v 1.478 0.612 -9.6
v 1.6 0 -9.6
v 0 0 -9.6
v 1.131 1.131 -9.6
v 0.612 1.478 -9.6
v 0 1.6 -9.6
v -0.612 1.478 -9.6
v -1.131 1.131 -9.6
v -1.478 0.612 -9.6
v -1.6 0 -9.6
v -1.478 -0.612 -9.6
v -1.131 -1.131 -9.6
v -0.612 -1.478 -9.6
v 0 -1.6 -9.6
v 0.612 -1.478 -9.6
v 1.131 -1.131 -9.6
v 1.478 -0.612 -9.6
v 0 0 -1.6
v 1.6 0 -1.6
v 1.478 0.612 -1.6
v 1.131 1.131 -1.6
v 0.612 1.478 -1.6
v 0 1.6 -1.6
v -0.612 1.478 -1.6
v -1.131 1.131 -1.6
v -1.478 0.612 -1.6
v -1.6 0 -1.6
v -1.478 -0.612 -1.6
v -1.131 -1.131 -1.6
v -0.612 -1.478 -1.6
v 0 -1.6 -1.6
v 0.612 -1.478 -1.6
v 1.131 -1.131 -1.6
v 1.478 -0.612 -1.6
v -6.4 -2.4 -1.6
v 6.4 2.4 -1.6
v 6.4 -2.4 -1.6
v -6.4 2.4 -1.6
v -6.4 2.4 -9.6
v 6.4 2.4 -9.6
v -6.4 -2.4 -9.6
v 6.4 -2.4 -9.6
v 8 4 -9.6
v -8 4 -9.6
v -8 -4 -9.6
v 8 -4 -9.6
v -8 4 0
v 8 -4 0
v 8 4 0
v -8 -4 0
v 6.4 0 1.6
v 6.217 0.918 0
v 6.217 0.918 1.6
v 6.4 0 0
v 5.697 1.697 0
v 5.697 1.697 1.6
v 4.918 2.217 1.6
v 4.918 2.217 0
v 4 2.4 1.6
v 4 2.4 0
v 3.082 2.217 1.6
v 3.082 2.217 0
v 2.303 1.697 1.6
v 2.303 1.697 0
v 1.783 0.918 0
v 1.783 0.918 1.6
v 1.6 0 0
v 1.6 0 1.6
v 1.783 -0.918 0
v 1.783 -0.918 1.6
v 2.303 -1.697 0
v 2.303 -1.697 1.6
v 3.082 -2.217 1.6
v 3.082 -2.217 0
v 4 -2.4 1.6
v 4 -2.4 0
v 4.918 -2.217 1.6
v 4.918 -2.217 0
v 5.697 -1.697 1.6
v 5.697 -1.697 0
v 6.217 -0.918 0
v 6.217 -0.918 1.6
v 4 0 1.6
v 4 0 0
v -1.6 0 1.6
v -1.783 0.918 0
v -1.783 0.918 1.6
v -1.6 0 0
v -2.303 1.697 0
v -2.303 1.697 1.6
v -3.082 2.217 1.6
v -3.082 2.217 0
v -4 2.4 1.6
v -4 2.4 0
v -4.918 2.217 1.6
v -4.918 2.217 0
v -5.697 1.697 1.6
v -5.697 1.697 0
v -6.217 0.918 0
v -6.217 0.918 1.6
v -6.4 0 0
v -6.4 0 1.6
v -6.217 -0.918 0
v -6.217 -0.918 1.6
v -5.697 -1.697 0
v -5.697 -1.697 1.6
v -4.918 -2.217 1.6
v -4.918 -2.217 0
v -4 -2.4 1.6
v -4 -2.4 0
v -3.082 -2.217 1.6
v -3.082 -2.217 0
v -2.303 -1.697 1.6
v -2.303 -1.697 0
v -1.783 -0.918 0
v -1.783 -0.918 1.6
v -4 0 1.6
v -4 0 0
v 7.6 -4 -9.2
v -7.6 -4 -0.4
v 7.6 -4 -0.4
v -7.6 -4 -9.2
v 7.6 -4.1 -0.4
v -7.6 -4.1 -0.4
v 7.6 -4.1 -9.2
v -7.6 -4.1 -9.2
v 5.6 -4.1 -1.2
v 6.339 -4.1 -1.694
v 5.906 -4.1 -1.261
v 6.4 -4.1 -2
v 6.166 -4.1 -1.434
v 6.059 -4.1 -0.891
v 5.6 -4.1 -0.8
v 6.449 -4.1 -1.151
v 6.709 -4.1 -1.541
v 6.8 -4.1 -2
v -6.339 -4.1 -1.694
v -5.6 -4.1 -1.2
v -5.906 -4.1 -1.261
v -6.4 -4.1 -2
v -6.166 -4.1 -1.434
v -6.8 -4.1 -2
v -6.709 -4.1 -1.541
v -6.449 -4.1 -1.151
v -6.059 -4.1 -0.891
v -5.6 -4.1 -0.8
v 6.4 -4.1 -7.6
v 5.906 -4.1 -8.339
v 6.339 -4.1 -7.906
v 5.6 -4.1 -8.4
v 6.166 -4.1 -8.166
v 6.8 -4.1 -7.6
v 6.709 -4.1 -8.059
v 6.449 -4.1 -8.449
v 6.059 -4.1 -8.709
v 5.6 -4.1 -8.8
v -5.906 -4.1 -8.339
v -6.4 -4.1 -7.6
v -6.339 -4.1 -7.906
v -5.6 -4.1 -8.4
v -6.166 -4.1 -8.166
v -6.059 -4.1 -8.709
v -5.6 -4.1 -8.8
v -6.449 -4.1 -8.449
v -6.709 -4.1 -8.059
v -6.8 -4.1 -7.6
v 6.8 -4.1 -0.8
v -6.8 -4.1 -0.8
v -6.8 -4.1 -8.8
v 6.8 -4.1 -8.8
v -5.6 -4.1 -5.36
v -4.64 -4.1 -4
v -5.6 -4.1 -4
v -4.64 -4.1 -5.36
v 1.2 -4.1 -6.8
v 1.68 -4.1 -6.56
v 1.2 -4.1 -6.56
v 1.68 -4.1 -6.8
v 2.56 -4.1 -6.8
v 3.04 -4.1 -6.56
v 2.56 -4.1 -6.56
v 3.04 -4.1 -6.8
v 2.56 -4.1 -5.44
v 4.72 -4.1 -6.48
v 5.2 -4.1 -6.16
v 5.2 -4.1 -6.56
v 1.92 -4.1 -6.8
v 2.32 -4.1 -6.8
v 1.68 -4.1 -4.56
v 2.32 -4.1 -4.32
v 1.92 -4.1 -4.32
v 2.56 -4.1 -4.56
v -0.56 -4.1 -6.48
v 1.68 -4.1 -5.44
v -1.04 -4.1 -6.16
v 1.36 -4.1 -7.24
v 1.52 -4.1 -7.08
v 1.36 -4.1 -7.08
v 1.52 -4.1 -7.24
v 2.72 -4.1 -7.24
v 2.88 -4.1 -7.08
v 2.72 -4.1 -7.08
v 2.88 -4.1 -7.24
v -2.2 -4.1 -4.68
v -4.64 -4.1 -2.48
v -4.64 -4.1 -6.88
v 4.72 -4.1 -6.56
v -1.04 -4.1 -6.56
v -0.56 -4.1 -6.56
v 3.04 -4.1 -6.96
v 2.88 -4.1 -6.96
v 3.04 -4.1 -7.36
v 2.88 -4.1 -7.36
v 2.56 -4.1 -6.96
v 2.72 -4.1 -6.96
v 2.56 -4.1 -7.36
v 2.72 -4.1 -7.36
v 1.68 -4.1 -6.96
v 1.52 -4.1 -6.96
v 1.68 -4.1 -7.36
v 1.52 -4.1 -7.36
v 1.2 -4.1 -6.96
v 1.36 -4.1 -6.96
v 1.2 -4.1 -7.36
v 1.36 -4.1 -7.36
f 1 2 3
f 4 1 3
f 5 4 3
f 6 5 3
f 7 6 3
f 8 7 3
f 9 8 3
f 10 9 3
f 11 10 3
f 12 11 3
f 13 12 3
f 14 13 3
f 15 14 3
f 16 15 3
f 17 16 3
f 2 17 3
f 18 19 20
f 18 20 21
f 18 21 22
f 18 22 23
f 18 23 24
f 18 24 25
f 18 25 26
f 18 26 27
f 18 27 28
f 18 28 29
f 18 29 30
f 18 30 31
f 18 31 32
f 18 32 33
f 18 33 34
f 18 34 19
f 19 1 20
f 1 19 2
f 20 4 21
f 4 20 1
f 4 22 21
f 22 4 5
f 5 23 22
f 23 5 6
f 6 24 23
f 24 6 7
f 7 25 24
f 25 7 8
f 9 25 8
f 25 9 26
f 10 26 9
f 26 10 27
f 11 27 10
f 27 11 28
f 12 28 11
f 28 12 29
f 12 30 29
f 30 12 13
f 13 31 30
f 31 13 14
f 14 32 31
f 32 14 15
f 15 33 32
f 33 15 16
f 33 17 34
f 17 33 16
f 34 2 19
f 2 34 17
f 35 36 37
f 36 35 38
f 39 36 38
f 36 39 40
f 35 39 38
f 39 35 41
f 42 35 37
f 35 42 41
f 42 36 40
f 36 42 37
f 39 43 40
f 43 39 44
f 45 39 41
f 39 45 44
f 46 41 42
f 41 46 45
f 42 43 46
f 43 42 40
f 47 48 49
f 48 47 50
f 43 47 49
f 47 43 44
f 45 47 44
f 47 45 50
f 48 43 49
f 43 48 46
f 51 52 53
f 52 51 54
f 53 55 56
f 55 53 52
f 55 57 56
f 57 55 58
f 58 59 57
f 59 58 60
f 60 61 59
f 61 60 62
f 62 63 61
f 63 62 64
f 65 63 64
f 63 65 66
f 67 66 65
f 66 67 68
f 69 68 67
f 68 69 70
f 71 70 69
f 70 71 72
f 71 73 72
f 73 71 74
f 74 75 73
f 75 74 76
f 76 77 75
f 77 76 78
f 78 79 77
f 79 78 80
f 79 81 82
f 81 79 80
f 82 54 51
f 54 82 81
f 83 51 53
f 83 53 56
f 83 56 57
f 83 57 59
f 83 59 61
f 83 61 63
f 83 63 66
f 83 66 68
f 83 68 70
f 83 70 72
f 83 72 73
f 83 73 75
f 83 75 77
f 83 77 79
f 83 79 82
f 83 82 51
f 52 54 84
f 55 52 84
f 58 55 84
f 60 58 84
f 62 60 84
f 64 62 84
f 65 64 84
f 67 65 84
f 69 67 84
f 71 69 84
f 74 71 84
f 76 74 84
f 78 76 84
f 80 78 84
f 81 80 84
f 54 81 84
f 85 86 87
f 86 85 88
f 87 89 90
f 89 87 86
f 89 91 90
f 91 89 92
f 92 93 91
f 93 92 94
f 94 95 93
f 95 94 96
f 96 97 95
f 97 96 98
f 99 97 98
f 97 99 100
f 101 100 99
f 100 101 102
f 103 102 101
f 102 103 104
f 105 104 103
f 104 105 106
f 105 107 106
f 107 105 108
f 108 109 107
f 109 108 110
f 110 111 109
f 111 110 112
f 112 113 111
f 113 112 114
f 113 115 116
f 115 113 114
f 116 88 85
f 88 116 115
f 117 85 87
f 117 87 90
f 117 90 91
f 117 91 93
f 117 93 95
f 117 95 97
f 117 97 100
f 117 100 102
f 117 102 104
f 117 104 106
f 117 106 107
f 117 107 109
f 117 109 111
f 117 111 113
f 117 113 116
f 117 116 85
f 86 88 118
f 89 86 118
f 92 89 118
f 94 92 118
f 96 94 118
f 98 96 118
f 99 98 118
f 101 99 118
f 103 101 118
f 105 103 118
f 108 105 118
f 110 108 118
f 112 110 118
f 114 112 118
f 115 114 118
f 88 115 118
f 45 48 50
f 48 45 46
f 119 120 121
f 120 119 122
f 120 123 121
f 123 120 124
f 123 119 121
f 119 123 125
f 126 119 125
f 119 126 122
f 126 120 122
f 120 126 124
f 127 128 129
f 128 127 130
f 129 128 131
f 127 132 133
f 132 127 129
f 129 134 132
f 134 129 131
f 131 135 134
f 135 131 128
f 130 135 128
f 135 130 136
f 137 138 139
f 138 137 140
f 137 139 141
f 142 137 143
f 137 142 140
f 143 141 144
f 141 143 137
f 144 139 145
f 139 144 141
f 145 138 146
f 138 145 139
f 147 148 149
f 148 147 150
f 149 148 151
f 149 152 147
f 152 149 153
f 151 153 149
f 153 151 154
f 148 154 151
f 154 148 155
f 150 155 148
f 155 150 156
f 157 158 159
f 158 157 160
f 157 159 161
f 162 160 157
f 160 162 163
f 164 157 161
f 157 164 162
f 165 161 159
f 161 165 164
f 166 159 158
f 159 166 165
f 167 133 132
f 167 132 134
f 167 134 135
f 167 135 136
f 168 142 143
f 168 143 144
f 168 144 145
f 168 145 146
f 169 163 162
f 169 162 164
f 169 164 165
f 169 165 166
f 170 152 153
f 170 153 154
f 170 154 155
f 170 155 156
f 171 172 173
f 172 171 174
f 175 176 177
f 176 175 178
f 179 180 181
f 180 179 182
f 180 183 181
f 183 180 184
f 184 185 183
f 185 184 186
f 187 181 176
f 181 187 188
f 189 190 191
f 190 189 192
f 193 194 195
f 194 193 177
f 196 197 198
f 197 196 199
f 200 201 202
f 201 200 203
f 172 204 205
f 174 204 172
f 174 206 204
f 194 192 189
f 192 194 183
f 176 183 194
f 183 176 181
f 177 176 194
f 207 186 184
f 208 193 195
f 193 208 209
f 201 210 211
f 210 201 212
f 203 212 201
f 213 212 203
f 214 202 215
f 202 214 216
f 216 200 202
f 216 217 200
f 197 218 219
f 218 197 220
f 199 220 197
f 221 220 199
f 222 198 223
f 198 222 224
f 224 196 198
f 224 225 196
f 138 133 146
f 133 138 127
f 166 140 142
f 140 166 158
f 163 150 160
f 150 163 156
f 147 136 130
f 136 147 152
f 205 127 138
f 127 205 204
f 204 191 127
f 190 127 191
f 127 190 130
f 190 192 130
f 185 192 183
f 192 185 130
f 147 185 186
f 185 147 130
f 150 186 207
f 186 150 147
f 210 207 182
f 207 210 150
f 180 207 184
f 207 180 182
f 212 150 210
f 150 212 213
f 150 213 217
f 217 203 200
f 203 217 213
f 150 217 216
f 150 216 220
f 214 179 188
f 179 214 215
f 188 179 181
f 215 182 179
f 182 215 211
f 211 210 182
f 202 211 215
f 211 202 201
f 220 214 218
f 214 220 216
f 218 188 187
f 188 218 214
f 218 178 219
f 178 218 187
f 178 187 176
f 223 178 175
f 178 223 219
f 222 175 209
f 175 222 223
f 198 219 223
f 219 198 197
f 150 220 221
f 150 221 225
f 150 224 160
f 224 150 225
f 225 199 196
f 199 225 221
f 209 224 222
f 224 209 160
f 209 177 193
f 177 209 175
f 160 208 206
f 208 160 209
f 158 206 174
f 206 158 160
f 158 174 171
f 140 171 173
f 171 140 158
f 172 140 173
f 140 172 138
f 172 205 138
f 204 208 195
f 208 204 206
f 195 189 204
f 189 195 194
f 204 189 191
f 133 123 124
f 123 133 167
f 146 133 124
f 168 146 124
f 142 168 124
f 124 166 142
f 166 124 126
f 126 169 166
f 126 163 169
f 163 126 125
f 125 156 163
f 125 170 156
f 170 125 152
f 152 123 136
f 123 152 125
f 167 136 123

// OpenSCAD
// file: ../p/4-4edge.scad
use <../lib.scad>
function ldraw_lib__4_4edge() = [
// 0 Circle 1.0
// 0 Name: 4-4edge.dat
// 0 Author: James Jessiman
// 0 !LDRAW_ORG Primitive UPDATE 2017-01
// 0 !LICENSE Licensed under CC BY 2.0 and CC BY 4.0 : see CAreadme.txt
// 
// 0 BFC CERTIFY CCW
  [0,"BFC","CERTIFY"],
  [0,"BFC","CCW"],
// 
// 0 !HISTORY 1998-12-15 [PTadmin] Official Update 1998-10
// 0 !HISTORY 2005-12-28 [PTadmin] Official Update 2005-01
// 0 !HISTORY 2007-06-24 [PTadmin] Header formatted for Contributor Agreement
// 0 !HISTORY 2008-07-01 [PTadmin] Official Update 2008-01
// 0 !HISTORY 2017-01-15 [Steffen] BFCed
// 0 !HISTORY 2017-12-30 [PTadmin] Official Update 2017-01
// 
// 
// 2 24 1 0 0 0.9239 0 0.3827
  [2,24,1,0,0,0.9239,0,0.3827],
// 2 24 0.9239 0 0.3827 0.7071 0 0.7071
  [2,24,0.9239,0,0.3827,0.7071,0,0.7071],
// 2 24 0.7071 0 0.7071 0.3827 0 0.9239
  [2,24,0.7071,0,0.7071,0.3827,0,0.9239],
// 2 24 0.3827 0 0.9239 0 0 1
  [2,24,0.3827,0,0.9239,0,0,1],
// 2 24 0 0 1 -0.3827 0 0.9239
  [2,24,0,0,1,-0.3827,0,0.9239],
// 2 24 -0.3827 0 0.9239 -0.7071 0 0.7071
  [2,24,-0.3827,0,0.9239,-0.7071,0,0.7071],
// 2 24 -0.7071 0 0.7071 -0.9239 0 0.3827
  [2,24,-0.7071,0,0.7071,-0.9239,0,0.3827],
// 2 24 -0.9239 0 0.3827 -1 0 -0
  [2,24,-0.9239,0,0.3827,-1,0,-0],
// 2 24 -1 0 -0 -0.9239 0 -0.3827
  [2,24,-1,0,-0,-0.9239,0,-0.3827],
// 2 24 -0.9239 0 -0.3827 -0.7071 0 -0.7071
  [2,24,-0.9239,0,-0.3827,-0.7071,0,-0.7071],
// 2 24 -0.7071 0 -0.7071 -0.3827 0 -0.9239
  [2,24,-0.7071,0,-0.7071,-0.3827,0,-0.9239],
// 2 24 -0.3827 0 -0.9239 0 0 -1
  [2,24,-0.3827,0,-0.9239,0,0,-1],
// 2 24 0 0 -1 0.3827 0 -0.9239
  [2,24,0,0,-1,0.3827,0,-0.9239],
// 2 24 0.3827 0 -0.9239 0.7071 0 -0.7071
  [2,24,0.3827,0,-0.9239,0.7071,0,-0.7071],
// 2 24 0.7071 0 -0.7071 0.9239 0 -0.3827
  [2,24,0.7071,0,-0.7071,0.9239,0,-0.3827],
// 2 24 0.9239 0 -0.3827 1 0 0
  [2,24,0.9239,0,-0.3827,1,0,0],
];
module ldraw_lib__4_4edge(step=0, col=false, unit=2/5, alt=false, line=0.2, solid=!$preview)
    makepoly(ldraw_lib__4_4edge(), step=step, col=col, unit=unit, alt=alt, line=line, solid=solid);
ldraw_lib__4_4edge(line=0.2);
// file: ../p/4-4disc.scad
use <../lib.scad>
function ldraw_lib__4_4disc() = [
// 0 Disc 1.0
// 0 Name: 4-4disc.dat
// 0 Author: James Jessiman
// 0 !LDRAW_ORG Primitive UPDATE 2002-02
// 0 !LICENSE Licensed under CC BY 2.0 and CC BY 4.0 : see CAreadme.txt
// 
// 0 BFC CERTIFY CCW
  [0,"BFC","CERTIFY"],
  [0,"BFC","CCW"],
// 
// 0 !HISTORY 1998-12-15 [PTadmin] Official Update 1998-10
// 0 !HISTORY 2002-03-23 [sbliss] Added BFC statement
// 0 !HISTORY 2002-04-25 [PTadmin] Official Update 2002-02
// 0 !HISTORY 2007-06-24 [PTadmin] Header formatted for Contributor Agreement
// 0 !HISTORY 2008-07-01 [PTadmin] Official Update 2008-01
// 
// 
// 3 16 0 0 0 1 0 0 0.9239 0 0.3827
  [3,16,0,0,0,1,0,0,0.9239,0,0.3827],
// 3 16 0 0 0 0.9239 0 0.3827 0.7071 0 0.7071
  [3,16,0,0,0,0.9239,0,0.3827,0.7071,0,0.7071],
// 3 16 0 0 0 0.7071 0 0.7071 0.3827 0 0.9239
  [3,16,0,0,0,0.7071,0,0.7071,0.3827,0,0.9239],
// 3 16 0 0 0 0.3827 0 0.9239 0 0 1
  [3,16,0,0,0,0.3827,0,0.9239,0,0,1],
// 3 16 0 0 0 0 0 1 -0.3827 0 0.9239
  [3,16,0,0,0,0,0,1,-0.3827,0,0.9239],
// 3 16 0 0 0 -0.3827 0 0.9239 -0.7071 0 0.7071
  [3,16,0,0,0,-0.3827,0,0.9239,-0.7071,0,0.7071],
// 3 16 0 0 0 -0.7071 0 0.7071 -0.9239 0 0.3827
  [3,16,0,0,0,-0.7071,0,0.7071,-0.9239,0,0.3827],
// 3 16 0 0 0 -0.9239 0 0.3827 -1 0 -0
  [3,16,0,0,0,-0.9239,0,0.3827,-1,0,-0],
// 3 16 0 0 0 -1 0 -0 -0.9239 0 -0.3827
  [3,16,0,0,0,-1,0,-0,-0.9239,0,-0.3827],
// 3 16 0 0 0 -0.9239 0 -0.3827 -0.7071 0 -0.7071
  [3,16,0,0,0,-0.9239,0,-0.3827,-0.7071,0,-0.7071],
// 3 16 0 0 0 -0.7071 0 -0.7071 -0.3827 0 -0.9239
  [3,16,0,0,0,-0.7071,0,-0.7071,-0.3827,0,-0.9239],
// 3 16 0 0 0 -0.3827 0 -0.9239 0 0 -1
  [3,16,0,0,0,-0.3827,0,-0.9239,0,0,-1],
// 3 16 0 0 0 0 0 -1 0.3827 0 -0.9239
  [3,16,0,0,0,0,0,-1,0.3827,0,-0.9239],
// 3 16 0 0 0 0.3827 0 -0.9239 0.7071 0 -0.7071
  [3,16,0,0,0,0.3827,0,-0.9239,0.7071,0,-0.7071],
// 3 16 0 0 0 0.7071 0 -0.7071 0.9239 0 -0.3827
  [3,16,0,0,0,0.7071,0,-0.7071,0.9239,0,-0.3827],
// 3 16 0 0 0 0.9239 0 -0.3827 1 0 0
  [3,16,0,0,0,0.9239,0,-0.3827,1,0,0],
// 0
];
module ldraw_lib__4_4disc(step=0, col=false, unit=2/5, alt=false, line=0.2, solid=!$preview)
    makepoly(ldraw_lib__4_4disc(), step=step, col=col, unit=unit, alt=alt, line=line, solid=solid);
ldraw_lib__4_4disc(line=0.2);
// file: ../p/4-4cyli.scad
use <../lib.scad>
$fa=1; $fs=0.2;
function ldraw_lib__4_4cyli(realsolid=false) = [
// 0 Cylinder 1.0
// 0 Name: 4-4cyli.dat
// 0 Author: James Jessiman
// 0 !LDRAW_ORG Primitive UPDATE 2005-01
// 0 !LICENSE Licensed under CC BY 2.0 and CC BY 4.0 : see CAreadme.txt
// 
// 0 BFC CERTIFY CCW
  [0,"BFC","CERTIFY"],
  [0,"BFC","CCW"],
// 
// 0 !HISTORY 1998-12-15 [PTadmin] Official Update 1998-10
// 0 !HISTORY 2002-03-23 [sbliss] Added BFC statement; merged headers from files in distributions LDraw 0.27 and Complete.
// 0 !HISTORY 2002-04-25 [PTadmin] Official Update 2002-02
// 0 !HISTORY 2004-12-14 [guyvivan] BFC CCW
// 0 !HISTORY 2005-12-28 [PTadmin] Official Update 2005-01
// 0 !HISTORY 2007-06-24 [PTadmin] Header formatted for Contributor Agreement
// 0 !HISTORY 2008-07-01 [PTadmin] Official Update 2008-01
// 
// 
// 4 16 1 1 0 0.9239 1 0.3827 0.9239 0 0.3827 1 0 0
  [4,16,1,1,0,0.9239,1,0.3827,0.9239,0,0.3827,1,0,0],
// 5 24 1 0 0 1 1 0 0.9239 0 0.3827 0.9239 0 -0.3827
  [5,24,1,0,0,1,1,0,0.9239,0,0.3827,0.9239,0,-0.3827],
// 4 16 0.9239 1 0.3827 0.7071 1 0.7071 0.7071 0 0.7071 0.9239 0 0.3827
  [4,16,0.9239,1,0.3827,0.7071,1,0.7071,0.7071,0,0.7071,0.9239,0,0.3827],
// 5 24 0.9239 0 0.3827 0.9239 1 0.3827 0.7071 0 0.7071 1 0 0
  [5,24,0.9239,0,0.3827,0.9239,1,0.3827,0.7071,0,0.7071,1,0,0],
// 4 16 0.7071 1 0.7071 0.3827 1 0.9239 0.3827 0 0.9239 0.7071 0 0.7071
  [4,16,0.7071,1,0.7071,0.3827,1,0.9239,0.3827,0,0.9239,0.7071,0,0.7071],
// 5 24 0.7071 0 0.7071 0.7071 1 0.7071 0.3827 0 0.9239 0.9239 0 0.3827
  [5,24,0.7071,0,0.7071,0.7071,1,0.7071,0.3827,0,0.9239,0.9239,0,0.3827],
// 4 16 0.3827 1 0.9239 0 1 1 0 0 1 0.3827 0 0.9239
  [4,16,0.3827,1,0.9239,0,1,1,0,0,1,0.3827,0,0.9239],
// 5 24 0.3827 0 0.9239 0.3827 1 0.9239 0 0 1 0.7071 0 0.7071
  [5,24,0.3827,0,0.9239,0.3827,1,0.9239,0,0,1,0.7071,0,0.7071],
// 4 16 0 1 1 -0.3827 1 0.9239 -0.3827 0 0.9239 0 0 1
  [4,16,0,1,1,-0.3827,1,0.9239,-0.3827,0,0.9239,0,0,1],
// 5 24 0 0 1 0 1 1 -0.3827 0 0.9239 0.3827 0 0.9239
  [5,24,0,0,1,0,1,1,-0.3827,0,0.9239,0.3827,0,0.9239],
// 4 16 -0.3827 1 0.9239 -0.7071 1 0.7071 -0.7071 0 0.7071 -0.3827 0 0.9239
  [4,16,-0.3827,1,0.9239,-0.7071,1,0.7071,-0.7071,0,0.7071,-0.3827,0,0.9239],
// 5 24 -0.3827 0 0.9239 -0.3827 1 0.9239 -0.7071 0 0.7071 0 0 1
  [5,24,-0.3827,0,0.9239,-0.3827,1,0.9239,-0.7071,0,0.7071,0,0,1],
// 4 16 -0.7071 1 0.7071 -0.9239 1 0.3827 -0.9239 0 0.3827 -0.7071 0 0.7071
  [4,16,-0.7071,1,0.7071,-0.9239,1,0.3827,-0.9239,0,0.3827,-0.7071,0,0.7071],
// 5 24 -0.7071 0 0.7071 -0.7071 1 0.7071 -0.9239 0 0.3827 -0.3827 0 0.9239
  [5,24,-0.7071,0,0.7071,-0.7071,1,0.7071,-0.9239,0,0.3827,-0.3827,0,0.9239],
// 4 16 -0.9239 1 0.3827 -1 1 0 -1 0 0 -0.9239 0 0.3827
  [4,16,-0.9239,1,0.3827,-1,1,0,-1,0,0,-0.9239,0,0.3827],
// 5 24 -0.9239 0 0.3827 -0.9239 1 0.3827 -1 0 0 -0.7071 0 0.7071
  [5,24,-0.9239,0,0.3827,-0.9239,1,0.3827,-1,0,0,-0.7071,0,0.7071],
// 4 16 -1 1 0 -0.9239 1 -0.3827 -0.9239 0 -0.3827 -1 0 0
  [4,16,-1,1,0,-0.9239,1,-0.3827,-0.9239,0,-0.3827,-1,0,0],
// 5 24 -1 0 0 -1 1 0 -0.9239 0 -0.3827 -0.9239 0 0.3827
  [5,24,-1,0,0,-1,1,0,-0.9239,0,-0.3827,-0.9239,0,0.3827],
// 4 16 -0.9239 1 -0.3827 -0.7071 1 -0.7071 -0.7071 0 -0.7071 -0.9239 0 -0.3827
  [4,16,-0.9239,1,-0.3827,-0.7071,1,-0.7071,-0.7071,0,-0.7071,-0.9239,0,-0.3827],
// 5 24 -0.9239 0 -0.3827 -0.9239 1 -0.3827 -0.7071 0 -0.7071 -1 0 0
  [5,24,-0.9239,0,-0.3827,-0.9239,1,-0.3827,-0.7071,0,-0.7071,-1,0,0],
// 4 16 -0.7071 1 -0.7071 -0.3827 1 -0.9239 -0.3827 0 -0.9239 -0.7071 0 -0.7071
  [4,16,-0.7071,1,-0.7071,-0.3827,1,-0.9239,-0.3827,0,-0.9239,-0.7071,0,-0.7071],
// 5 24 -0.7071 0 -0.7071 -0.7071 1 -0.7071 -0.3827 0 -0.9239 -0.9239 0 -0.3827
  [5,24,-0.7071,0,-0.7071,-0.7071,1,-0.7071,-0.3827,0,-0.9239,-0.9239,0,-0.3827],
// 4 16 -0.3827 1 -0.9239 0 1 -1 0 0 -1 -0.3827 0 -0.9239
  [4,16,-0.3827,1,-0.9239,0,1,-1,0,0,-1,-0.3827,0,-0.9239],
// 5 24 -0.3827 0 -0.9239 -0.3827 1 -0.9239 0 0 -1 -0.7071 0 -0.7071
  [5,24,-0.3827,0,-0.9239,-0.3827,1,-0.9239,0,0,-1,-0.7071,0,-0.7071],
// 4 16 0 1 -1 0.3827 1 -0.9239 0.3827 0 -0.9239 0 0 -1
  [4,16,0,1,-1,0.3827,1,-0.9239,0.3827,0,-0.9239,0,0,-1],
// 5 24 0 0 -1 0 1 -1 0.3827 0 -0.9239 -0.3827 0 -0.9239
  [5,24,0,0,-1,0,1,-1,0.3827,0,-0.9239,-0.3827,0,-0.9239],
// 4 16 0.3827 1 -0.9239 0.7071 1 -0.7071 0.7071 0 -0.7071 0.3827 0 -0.9239
  [4,16,0.3827,1,-0.9239,0.7071,1,-0.7071,0.7071,0,-0.7071,0.3827,0,-0.9239],
// 5 24 0.3827 0 -0.9239 0.3827 1 -0.9239 0.7071 0 -0.7071 0 0 -1
  [5,24,0.3827,0,-0.9239,0.3827,1,-0.9239,0.7071,0,-0.7071,0,0,-1],
// 4 16 0.7071 1 -0.7071 0.9239 1 -0.3827 0.9239 0 -0.3827 0.7071 0 -0.7071
  [4,16,0.7071,1,-0.7071,0.9239,1,-0.3827,0.9239,0,-0.3827,0.7071,0,-0.7071],
// 5 24 0.7071 0 -0.7071 0.7071 1 -0.7071 0.9239 0 -0.3827 0.3827 0 -0.9239
  [5,24,0.7071,0,-0.7071,0.7071,1,-0.7071,0.9239,0,-0.3827,0.3827,0,-0.9239],
// 4 16 0.9239 1 -0.3827 1 1 0 1 0 0 0.9239 0 -0.3827
  [4,16,0.9239,1,-0.3827,1,1,0,1,0,0,0.9239,0,-0.3827],
// 5 24 0.9239 0 -0.3827 0.9239 1 -0.3827 1 0 0 0.7071 0 -0.7071
  [5,24,0.9239,0,-0.3827,0.9239,1,-0.3827,1,0,0,0.7071,0,-0.7071],
// 0
];
module ldraw_lib__4_4cyli(step=0, col=false, unit=2/5, alt=false, line=0.2, solid=!$preview)
    makepoly(ldraw_lib__4_4cyli(solid), step=step, col=col, unit=unit, alt=alt, line=line, solid=solid);
ldraw_lib__4_4cyli(line=0.2);
// file: ../p/stud3.scad
use <../lib.scad>
use <4-4cyli.scad>
use <4-4disc.scad>
use <4-4edge.scad>
function ldraw_lib__stud3() = [
// 0 Stud Tube Solid
// 0 Name: stud3.dat
// 0 Author: James Jessiman
// 0 !LDRAW_ORG Primitive UPDATE 2012-01
// 0 !LICENSE Licensed under CC BY 4.0 : see CAreadme.txt
// 
// 0 BFC CERTIFY CCW
  [0,"BFC","CERTIFY"],
  [0,"BFC","CCW"],
// 
// 0 !HISTORY 2002-04-04 [sbliss] Modified for BFC compliance
// 0 !HISTORY 2002-04-25 [PTadmin] Official Update 2002-02
// 0 !HISTORY 2007-06-24 [PTadmin] Header formatted for Contributor Agreement
// 0 !HISTORY 2008-07-01 [PTadmin] Official Update 2008-01
// 0 !HISTORY 2012-02-16 [Philo] Changed to CCW
// 0 !HISTORY 2012-03-30 [PTadmin] Official Update 2012-01
// 
// 
// 1 16 0 -4 0 4 0 0 0 1 0 0 0 4 4-4edge.dat
  [1,16,0,-4,0,4,0,0,0,1,0,0,0,4, ldraw_lib__4_4edge()],
// 1 16 0 0 0 4 0 0 0 1 0 0 0 4 4-4edge.dat
  [1,16,0,0,0,4,0,0,0,1,0,0,0,4, ldraw_lib__4_4edge()],
// 1 16 0 -4 0 4 0 0 0 1 0 0 0 4 4-4disc.dat
  [1,16,0,-4,0,4,0,0,0,1,0,0,0,4, ldraw_lib__4_4disc()],
  [-1,16,0,0,0,4,0,0,0,-1,0,0,0,4, ldraw_lib__4_4disc()],
// 1 16 0 -4 0 4 0 0 0 4 0 0 0 4 4-4cyli.dat
  [1,16,0,-4,0,4,0,0,0,4,0,0,0,4, ldraw_lib__4_4cyli()],
];
module ldraw_lib__stud3(step=0, col=false, unit=2/5, alt=false, line=0.2, solid=!$preview)
    makepoly(ldraw_lib__stud3(), step=step, col=col, unit=unit, alt=alt, line=line, solid=solid);
ldraw_lib__stud3(line=0.2);
// file: ../p/stud.scad
use <../lib.scad>
use <4-4cyli.scad>
use <4-4disc.scad>
use <4-4edge.scad>
function ldraw_lib__stud() = [
// 0 Stud
// 0 Name: stud.dat
// 0 Author: James Jessiman
// 0 !LDRAW_ORG Primitive UPDATE 2012-01
// 0 !LICENSE Licensed under CC BY 4.0 : see CAreadme.txt
// 
// 0 BFC CERTIFY CCW
  [0,"BFC","CERTIFY"],
  [0,"BFC","CCW"],
// 
// 0 !HISTORY 2002-04-04 [sbliss] Modified for BFC compliance
// 0 !HISTORY 2002-04-25 [PTadmin] Official Update 2002-02
// 0 !HISTORY 2007-06-24 [PTadmin] Header formatted for Contributor Agreement
// 0 !HISTORY 2008-07-01 [PTadmin] Official Update 2008-01
// 0 !HISTORY 2012-02-16 [Philo] Changed to CCW
// 0 !HISTORY 2012-03-30 [PTadmin] Official Update 2012-01
// 
// 
// 1 16 0 0 0 6 0 0 0 1 0 0 0 6 4-4edge.dat
  [1,16,0,0,0,6,0,0,0,1,0,0,0,6, ldraw_lib__4_4edge()],
// 1 16 0 -4 0 6 0 0 0 1 0 0 0 6 4-4edge.dat
  [1,16,0,-4,0,6,0,0,0,1,0,0,0,6, ldraw_lib__4_4edge()],
// 1 16 0 0 0 6 0 0 0 -4 0 0 0 6 4-4cyli.dat
  [1,16,0,0,0,6,0,0,0,-4,0,0,0,6, ldraw_lib__4_4cyli()],
// 1 16 0 -4 0 6 0 0 0 1 0 0 0 6 4-4disc.dat
  [1,16,0,-4,0,6,0,0,0,1,0,0,0,6, ldraw_lib__4_4disc()],
  [-1,16,0,0,0,6,0,0,0,-1,0,0,0,6, ldraw_lib__4_4disc()],
];
module ldraw_lib__stud(step=0, col=false, unit=2/5, alt=false, line=0.2, solid=!$preview)
    makepoly(ldraw_lib__stud(), step=step, col=col, unit=unit, alt=alt, line=line, solid=solid);
ldraw_lib__stud(line=0.2);
// file: ../p/box5.scad
use <../lib.scad>
function ldraw_lib__box5() = [
// 0 Box with 5 Faces and All Edges
// 0 Name: box5.dat
// 0 Author: James Jessiman
// 0 !LDRAW_ORG Primitive UPDATE 2012-01
// 0 !LICENSE Licensed under CC BY 2.0 and CC BY 4.0 : see CAreadme.txt
// 
// 0 BFC CERTIFY CCW
  [0,"BFC","CERTIFY"],
  [0,"BFC","CCW"],
// 
// 0 !HISTORY 2002-04-03 [sbliss] Modified for BFC compliance
// 0 !HISTORY 2002-04-25 [PTadmin] Official Update 2002-02
// 0 !HISTORY 2007-06-24 [PTadmin] Header formatted for Contributor Agreement
// 0 !HISTORY 2008-07-01 [PTadmin] Official Update 2008-01
// 0 !HISTORY 2012-02-16 [Philo] Changed to CCW
// 0 !HISTORY 2012-03-30 [PTadmin] Official Update 2012-01
// 
// 
// 2 24 1 1 1 -1 1 1
  [2,24,1,1,1,-1,1,1],
// 2 24 -1 1 1 -1 1 -1
  [2,24,-1,1,1,-1,1,-1],
// 2 24 -1 1 -1 1 1 -1
  [2,24,-1,1,-1,1,1,-1],
// 2 24 1 1 -1 1 1 1
  [2,24,1,1,-1,1,1,1],
// 2 24 1 0 1 -1 0 1
  [2,24,1,0,1,-1,0,1],
// 2 24 -1 0 1 -1 0 -1
  [2,24,-1,0,1,-1,0,-1],
// 2 24 -1 0 -1 1 0 -1
  [2,24,-1,0,-1,1,0,-1],
// 2 24 1 0 -1 1 0 1
  [2,24,1,0,-1,1,0,1],
// 2 24 1 0 1 1 1 1
  [2,24,1,0,1,1,1,1],
// 2 24 -1 0 1 -1 1 1
  [2,24,-1,0,1,-1,1,1],
// 2 24 1 0 -1 1 1 -1
  [2,24,1,0,-1,1,1,-1],
// 2 24 -1 0 -1 -1 1 -1
  [2,24,-1,0,-1,-1,1,-1],
// 4 16 -1 1 1 1 1 1 1 1 -1 -1 1 -1
  [4,16,-1,1,1,1,1,1,1,1,-1,-1,1,-1],
// 4 16 -1 1 1 -1 0 1 1 0 1 1 1 1
  [4,16,-1,1,1,-1,0,1,1,0,1,1,1,1],
// 4 16 -1 1 -1 -1 0 -1 -1 0 1 -1 1 1
  [4,16,-1,1,-1,-1,0,-1,-1,0,1,-1,1,1],
// 4 16 1 1 -1 1 0 -1 -1 0 -1 -1 1 -1
  [4,16,1,1,-1,1,0,-1,-1,0,-1,-1,1,-1],
// 4 16 1 1 1 1 0 1 1 0 -1 1 1 -1
  [4,16,1,1,1,1,0,1,1,0,-1,1,1,-1],
];
makepoly(ldraw_lib__box5(), line=0.2);
// file: ../p/box4t.scad
use <../lib.scad>
function ldraw_lib__box4t() = [
// 0 Box with 4 Adjacent Faces and All Edges
// 0 Name: box4t.dat
// 0 Author: Tore Eriksson [Tore_Eriksson]
// 0 !LDRAW_ORG Primitive UPDATE 2003-02
// 0 !LICENSE Licensed under CC BY 2.0 and CC BY 4.0 : see CAreadme.txt
// 
// 0 BFC CERTIFY CCW
  [0,"BFC","CERTIFY"],
  [0,"BFC","CCW"],
// 
// 0 !HISTORY 1997-09-29 [PTadmin] Official Update 1997-15
// 0 !HISTORY 2002-08-31 [izanette] Modified with WINDZ for BFC compliance
// 0 !HISTORY 2003-08-01 [PTadmin] Official Update 2003-02
// 0 !HISTORY 2007-06-24 [PTadmin] Header formatted for Contributor Agreement
// 0 !HISTORY 2008-07-01 [PTadmin] Official Update 2008-01
// 
// 
// 2 24 1 1 1 -1 1 1
  [2,24,1,1,1,-1,1,1],
// 2 24 -1 1 1 -1 1 -1
  [2,24,-1,1,1,-1,1,-1],
// 2 24 -1 1 -1 1 1 -1
  [2,24,-1,1,-1,1,1,-1],
// 2 24 1 1 -1 1 1 1
  [2,24,1,1,-1,1,1,1],
// 2 24 1 0 1 -1 0 1
  [2,24,1,0,1,-1,0,1],
// 2 24 -1 0 1 -1 0 -1
  [2,24,-1,0,1,-1,0,-1],
// 2 24 -1 0 -1 1 0 -1
  [2,24,-1,0,-1,1,0,-1],
// 2 24 1 0 -1 1 0 1
  [2,24,1,0,-1,1,0,1],
// 2 24 1 0 1 1 1 1
  [2,24,1,0,1,1,1,1],
// 2 24 -1 0 1 -1 1 1
  [2,24,-1,0,1,-1,1,1],
// 2 24 1 0 -1 1 1 -1
  [2,24,1,0,-1,1,1,-1],
// 2 24 -1 0 -1 -1 1 -1
  [2,24,-1,0,-1,-1,1,-1],
// 4 16 1 1 1 1 1 -1 -1 1 -1 -1 1 1
  [4,16,1,1,1,1,1,-1,-1,1,-1,-1,1,1],
// 4 16 1 1 1 -1 1 1 -1 0 1 1 0 1
  [4,16,1,1,1,-1,1,1,-1,0,1,1,0,1],
// 4 16 -1 1 1 -1 1 -1 -1 0 -1 -1 0 1
  [4,16,-1,1,1,-1,1,-1,-1,0,-1,-1,0,1],
// 0 4 16 -1 1 -1 -1 0 -1 1 0 -1 1 1 -1
// 4 16 1 1 -1 1 1 1 1 0 1 1 0 -1
  [4,16,1,1,-1,1,1,1,1,0,1,1,0,-1],
// 0
];
makepoly(ldraw_lib__box4t(), line=0.2);
// file: ../p/box5-12.scad
use <../lib.scad>
function ldraw_lib__box5_12() = [
// 0 Box with 5 Faces without Any Edges
// 0 Name: box5-12.dat
// 0 Author: Chris Dee [cwdee]
// 0 !LDRAW_ORG Primitive UPDATE 2009-02
// 0 !LICENSE Licensed under CC BY 2.0 and CC BY 4.0 : see CAreadme.txt
// 
// 0 BFC CERTIFY CCW
  [0,"BFC","CERTIFY"],
  [0,"BFC","CCW"],
// 
// 0 !HISTORY 2009-09-03 [PTadmin] Official Update 2009-02
// 
// 
// 4 16 1 1 1 1 1 -1 -1 1 -1 -1 1 1
  [4,16,1,1,1,1,1,-1,-1,1,-1,-1,1,1],
// 4 16 -1 0 1 1 0 1 1 1 1 -1 1 1
  [4,16,-1,0,1,1,0,1,1,1,1,-1,1,1],
// 4 16 -1 0 -1 -1 0 1 -1 1 1 -1 1 -1
  [4,16,-1,0,-1,-1,0,1,-1,1,1,-1,1,-1],
// 4 16 1 0 -1 -1 0 -1 -1 1 -1 1 1 -1
  [4,16,1,0,-1,-1,0,-1,-1,1,-1,1,1,-1],
// 4 16 1 0 1 1 0 -1 1 1 -1 1 1 1
  [4,16,1,0,1,1,0,-1,1,1,-1,1,1,1],
// 0
];
module ldraw_lib__box5_12(step=0, col=false, unit=2/5, alt=false, line=0.2, solid=!$preview)
    makepoly(ldraw_lib__box5_12(), step=step, col=col, unit=unit, alt=alt, line=line, solid=solid);
ldraw_lib__box5_12(line=0.2);
// file: ../p/1-4ring2.scad
use <../lib.scad>
$fa=1; $fs=0.2;
function ldraw_lib__1_4ring2(realsolid=false) = [
// 0 Ring  2 x 0.25
// 0 Name: 1-4ring2.dat
// 0 Author: Franklin W. Cain [fwcain]
// 0 !LDRAW_ORG Primitive UPDATE 2015-01
// 0 !LICENSE Licensed under CC BY 2.0 and CC BY 4.0 : see CAreadme.txt
// 
// 0 BFC CERTIFY CCW
  [0,"BFC","CERTIFY"],
  [0,"BFC","CCW"],
// 
// 0 !HISTORY 2001-12-31 [PTadmin] Official Update 2001-03
// 0 !HISTORY 2007-06-22 [PTadmin] Header formatted for Contributor Agreement
// 0 !HISTORY 2008-07-01 [PTadmin] Official Update 2008-01
// 0 !HISTORY 2012-02-16 [Philo] Changed to CCW
// 0 !HISTORY 2012-03-30 [PTadmin] Official Update 2012-01
// 0 !HISTORY 2014-12-25 [MMR1988] Fixed a rounding issue
// 0 !HISTORY 2015-10-11 [PTadmin] Official Update 2015-01
// 
// 
// 4 16 3 0 0 2.7717 0 1.1481 1.8478 0 0.7654 2 0 0
  [4,16,3,0,0,2.7717,0,1.1481,1.8478,0,0.7654,2,0,0],
// 4 16 2.7717 0 1.1481 2.1213 0 2.1213 1.4142 0 1.4142 1.8478 0 0.7654
  [4,16,2.7717,0,1.1481,2.1213,0,2.1213,1.4142,0,1.4142,1.8478,0,0.7654],
// 4 16 2.1213 0 2.1213 1.1481 0 2.7717 0.7654 0 1.8478 1.4142 0 1.4142
  [4,16,2.1213,0,2.1213,1.1481,0,2.7717,0.7654,0,1.8478,1.4142,0,1.4142],
// 4 16 1.1481 0 2.7717 0 0 3 0 0 2 0.7654 0 1.8478
  [4,16,1.1481,0,2.7717,0,0,3,0,0,2,0.7654,0,1.8478],
// 0 // Build by Primitive Generator 2
];
module ldraw_lib__1_4ring2(step=0, col=false, unit=2/5, alt=false, line=0.2, solid=!$preview)
    makepoly(ldraw_lib__1_4ring2(solid), step=step, col=col, unit=unit, alt=alt, line=line, solid=solid);
ldraw_lib__1_4ring2(line=0.2);
// file: ../p/1-4ndis.scad
use <../lib.scad>
function ldraw_lib__1_4ndis() = [
// 0 Disc Negative 0.25
// 0 Name: 1-4ndis.dat
// 0 Author: James Jessiman
// 0 !LDRAW_ORG Primitive UPDATE 2012-01
// 0 !LICENSE Licensed under CC BY 2.0 and CC BY 4.0 : see CAreadme.txt
// 
// 0 BFC CERTIFY CCW
  [0,"BFC","CERTIFY"],
  [0,"BFC","CCW"],
// 
// 0 !HISTORY 2002-03-23 [sbliss] Added BFC Statement
// 0 !HISTORY 2002-04-25 [PTadmin] Official Update 2002-02
// 0 !HISTORY 2007-06-22 [PTadmin] Header formatted for Contributor Agreement
// 0 !HISTORY 2008-07-01 [PTadmin] Official Update 2008-01
// 0 !HISTORY 2012-02-16 [Philo] Changed to CCW
// 0 !HISTORY 2012-03-30 [PTadmin] Official Update 2012-01
// 
// 
// 3 16 0.9239 0 0.3827 1 0 0 1 0 1
  [3,16,0.9239,0,0.3827,1,0,0,1,0,1],
// 3 16 0.7071 0 0.7071 0.9239 0 0.3827 1 0 1
  [3,16,0.7071,0,0.7071,0.9239,0,0.3827,1,0,1],
// 3 16 0.3827 0 0.9239 0.7071 0 0.7071 1 0 1
  [3,16,0.3827,0,0.9239,0.7071,0,0.7071,1,0,1],
// 3 16 0 0 1 0.3827 0 0.9239 1 0 1
  [3,16,0,0,1,0.3827,0,0.9239,1,0,1],
];
module ldraw_lib__1_4ndis(step=0, col=false, unit=2/5, alt=false, line=0.2, solid=!$preview)
    makepoly(ldraw_lib__1_4ndis(), step=step, col=col, unit=unit, alt=alt, line=line, solid=solid);
ldraw_lib__1_4ndis(line=0.2);
// file: ../p/1-4chrd.scad
use <../lib.scad>
$fa=1; $fs=0.2;
function ldraw_lib__1_4chrd(realsolid=false) = [
// 0 Chord 0.25
// 0 Name: 1-4chrd.dat
// 0 Author: Tony Hafner [hafhead]
// 0 !LDRAW_ORG Primitive UPDATE 2012-02
// 0 !LICENSE Licensed under CC BY 2.0 and CC BY 4.0 : see CAreadme.txt
// 
// 0 BFC CERTIFY CCW
  [0,"BFC","CERTIFY"],
  [0,"BFC","CCW"],
// 
// 0 !HISTORY 2004-04-22 [PTadmin] Official Update 2004-02
// 0 !HISTORY 2007-10-09 [PTadmin] Header formatted for Contributor Agreement
// 0 !HISTORY 2008-07-01 [PTadmin] Official Update 2008-01
// 0 !HISTORY 2012-08-02 [MMR1988] Re-creation with PrimGen2 and Rectifier
// 0 !HISTORY 2012-08-09 [PTadmin] Official Update 2012-02
// 
// 
// 4 16 0.9239 0 0.3827 0.3827 0 0.9239 0 0 1 1 0 0
  [4,16,0.9239,0,0.3827,0.3827,0,0.9239,0,0,1,1,0,0],
// 3 16 0.7071 0 0.7071 0.3827 0 0.9239 0.9239 0 0.3827
  [3,16,0.7071,0,0.7071,0.3827,0,0.9239,0.9239,0,0.3827],
];
module ldraw_lib__1_4chrd(step=0, col=false, unit=2/5, alt=false, line=0.2, solid=!$preview)
    makepoly(ldraw_lib__1_4chrd(solid), step=step, col=col, unit=unit, alt=alt, line=line, solid=solid);
ldraw_lib__1_4chrd(line=0.2);
// file: s/3004s01.scad
use <../../lib.scad>
use <../../p/box4t.scad>
use <../../p/box5.scad>
use <../../p/stud.scad>
use <../../p/stud3.scad>
$fa=1; $fs=0.2;
function ldraw_lib__s__3004s01(realsolid=false) = [
// 0 ~Brick  1 x  2 without Front Face
// 0 Name: s\3004s01.dat
// 0 Author: James Jessiman
// 0 !LDRAW_ORG Subpart UPDATE 2003-03
// 0 !LICENSE Licensed under CC BY 2.0 and CC BY 4.0 : see CAreadme.txt
// 
// 0 BFC CERTIFY CCW
  [0,"BFC","CERTIFY"],
  [0,"BFC","CCW"],
// 
// 0 !HISTORY 2003-09-07 [jriley] Subfiling, BFC
// 0 !HISTORY 2003-12-19 [PTadmin] Official Update 2003-03
// 0 !HISTORY 2007-08-29 [PTadmin] Header formatted for Contributor Agreement
// 0 !HISTORY 2008-07-01 [PTadmin] Official Update 2008-01
// 
// 
// 1 16 0 4 0 1 0 0 0 -5 0 0 0 1 stud3.dat
  [1,16,0,4,0,1,0,0,0,-5,0,0,0,1, ldraw_lib__stud3(realsolid)],
// 0 BFC INVERTNEXT
  [0,"BFC","INVERTNEXT"],
// 1 16 0 24 0 16 0 0 0 -20 0 0 0 6 box5.dat
  [1,16,0,24,0,16,0,0,0,-20,0,0,0,6, ldraw_lib__box5(realsolid)],
// 4 16 20 24 10 16 24 6 -16 24 6 -20 24 10
  [4,16,20,24,10,16,24,6,-16,24,6,-20,24,10],
// 4 16 -20 24 10 -16 24 6 -16 24 -6 -20 24 -10
  [4,16,-20,24,10,-16,24,6,-16,24,-6,-20,24,-10],
// 4 16 -20 24 -10 -16 24 -6 16 24 -6 20 24 -10
  [4,16,-20,24,-10,-16,24,-6,16,24,-6,20,24,-10],
// 4 16 20 24 -10 16 24 -6 16 24 6 20 24 10
  [4,16,20,24,-10,16,24,-6,16,24,6,20,24,10],
// 1 16 0 24 0 20 0 0 0 -24 0 0 0 10 box4t.dat
  [1,16,0,24,0,20,0,0,0,-24,0,0,0,10, ldraw_lib__box4t(realsolid)],
// 1 16 10 0 0 1 0 0 0 1 0 0 0 1 stud.dat
  [1,16,10,0,0,1,0,0,0,1,0,0,0,1, ldraw_lib__stud(realsolid)],
// 1 16 -10 0 0 1 0 0 0 1 0 0 0 1 stud.dat
  [1,16,-10,0,0,1,0,0,0,1,0,0,0,1, ldraw_lib__stud(realsolid)],
// 0
];
module ldraw_lib__s__3004s01(step=0, col=false, unit=2/5, alt=false, line=0.2, solid=!$preview)
    makepoly(ldraw_lib__s__3004s01(solid), step=step, col=col, unit=unit, alt=alt, line=line, solid=solid);
ldraw_lib__s__3004s01(line=0.2);
// file: 3004.scad
use <../lib.scad>
use <s/3004s01.scad>
function ldraw_lib__3004() = [
// 0 Brick  1 x  2
// 0 Name: 3004.dat
// 0 Author: James Jessiman
// 0 !LDRAW_ORG Part UPDATE 2022-05
// 0 !LICENSE Licensed under CC BY 2.0 and CC BY 4.0 : see CAreadme.txt
// 
// 0 BFC CERTIFY CCW
  [0,"BFC","CERTIFY"],
  [0,"BFC","CCW"],
// 
// 0 !HISTORY 2001-10-26 [PTadmin] Official Update 2001-01
// 0 !HISTORY 2002-05-07 {unknown} BFC Certification
// 0 !HISTORY 2002-06-11 [PTadmin] Official Update 2002-03
// 0 !HISTORY 2007-05-07 [PTadmin] Header formatted for Contributor Agreement
// 0 !HISTORY 2008-07-01 [PTadmin] Official Update 2008-01
// 0 !HISTORY 2022-08-04 [MagFors] Using subfile
// 0 !HISTORY 2022-09-15 [PTadmin] Official Update 2022-05
// 
// 
// 1 16 0 0 0 1 0 0 0 1 0 0 0 1 s\3004s01.dat
  [1,16,0,0,0,1,0,0,0,1,0,0,0,1, ldraw_lib__s__3004s01()],
// 4 16 -20 24 -10 20 24 -10 20 0 -10 -20 0 -10
  [4,16,-20,24,-10,20,24,-10,20,0,-10,-20,0,-10],
];
module ldraw_lib__3004(step=0, col=false, unit=2/5, alt=false, line=0.2, solid=!$preview)
    makepoly(ldraw_lib__3004(), step=step, col=col, unit=unit, alt=alt, line=line, solid=solid);
ldraw_lib__3004(line=0.2);
// file: 163156d.scad
use <../lib.scad>
use <163156c.scad>
function ldraw_lib__163156d() = [
// 0 Sticker  1.1 x  1.9 with Town Airport Direction Signs - Right
// 0 Name: 163156d.dat
// 0 Author: Takeshi Takahashi [RainbowDolphin]
// 0 !LDRAW_ORG Part UPDATE 2020-03
// 0 !LICENSE Licensed under CC BY 2.0 and CC BY 4.0 : see CAreadme.txt
// 
// 0 BFC CERTIFY CCW
  [0,"BFC","CERTIFY"],
  [0,"BFC","CCW"],
// 
// 0 !KEYWORDS set 6396
// 
// 0 !HISTORY 2018-01-08 [bercik] OMR version by Robert Paciorek [bercik] with permission of Zoltank82
// 0 !HISTORY 2020-06-24 [RainbowDolphin] File preparation for LDraw Parts Tracker
// 0 !HISTORY 2020-12-29 [PTadmin] Official Update 2020-03
// 
// 
// 1 16 0 0 0 -1 0 0 0 1 0 0 0 1 163156c.dat
  [1,16,0,0,0,-1,0,0,0,1,0,0,0,1, ldraw_lib__163156c()],
];
makepoly(ldraw_lib__163156d(), line=0.2);
// main file
use <../lib.scad>
use <163156d.scad>
use <3004.scad>
function ldraw_lib__3004d0w() = [
// 0 Brick  1 x  2 with Town Airport Direction Signs on Light Grey Background Right Sticker
// 0 Name: 3004d0w.dat
// 0 Author: Takeshi Takahashi [RainbowDolphin]
// 0 !LDRAW_ORG Shortcut UPDATE 2024-07
// 0 !LICENSE Licensed under CC BY 4.0 : see CAreadme.txt
// 
// 0 BFC CERTIFY CCW
  [0,"BFC","CERTIFY"],
  [0,"BFC","CCW"],
// 
// 0 !CATEGORY Sticker Shortcut
// 0 !KEYWORDS Airport, Bricklink 3004pb018L, International jetport, set 6396
// 
// 0 !HISTORY 2024-08-26 [OrionP] Official Update 2024-07
// 
// 1 16 0 0 0 1 0 0 0 1 0 0 0 1 3004.dat
  [1,16,0,0,0,1,0,0,0,1,0,0,0,1, ldraw_lib__3004()],
// 1 16 0 12 -10 1 0 0 0 0 -1 0 1 0 163156d.dat
  [1,16,0,12,-10,1,0,0,0,0,-1,0,1,0, ldraw_lib__163156d()],
];
module ldraw_lib__3004d0w(step=0, col=false, unit=2/5, alt=false, line=0.2, solid=!$preview)
    makepoly(ldraw_lib__3004d0w(), step=step, col=col, unit=unit, alt=alt, line=line, solid=solid);
ldraw_lib__3004d0w(line=0.2);
